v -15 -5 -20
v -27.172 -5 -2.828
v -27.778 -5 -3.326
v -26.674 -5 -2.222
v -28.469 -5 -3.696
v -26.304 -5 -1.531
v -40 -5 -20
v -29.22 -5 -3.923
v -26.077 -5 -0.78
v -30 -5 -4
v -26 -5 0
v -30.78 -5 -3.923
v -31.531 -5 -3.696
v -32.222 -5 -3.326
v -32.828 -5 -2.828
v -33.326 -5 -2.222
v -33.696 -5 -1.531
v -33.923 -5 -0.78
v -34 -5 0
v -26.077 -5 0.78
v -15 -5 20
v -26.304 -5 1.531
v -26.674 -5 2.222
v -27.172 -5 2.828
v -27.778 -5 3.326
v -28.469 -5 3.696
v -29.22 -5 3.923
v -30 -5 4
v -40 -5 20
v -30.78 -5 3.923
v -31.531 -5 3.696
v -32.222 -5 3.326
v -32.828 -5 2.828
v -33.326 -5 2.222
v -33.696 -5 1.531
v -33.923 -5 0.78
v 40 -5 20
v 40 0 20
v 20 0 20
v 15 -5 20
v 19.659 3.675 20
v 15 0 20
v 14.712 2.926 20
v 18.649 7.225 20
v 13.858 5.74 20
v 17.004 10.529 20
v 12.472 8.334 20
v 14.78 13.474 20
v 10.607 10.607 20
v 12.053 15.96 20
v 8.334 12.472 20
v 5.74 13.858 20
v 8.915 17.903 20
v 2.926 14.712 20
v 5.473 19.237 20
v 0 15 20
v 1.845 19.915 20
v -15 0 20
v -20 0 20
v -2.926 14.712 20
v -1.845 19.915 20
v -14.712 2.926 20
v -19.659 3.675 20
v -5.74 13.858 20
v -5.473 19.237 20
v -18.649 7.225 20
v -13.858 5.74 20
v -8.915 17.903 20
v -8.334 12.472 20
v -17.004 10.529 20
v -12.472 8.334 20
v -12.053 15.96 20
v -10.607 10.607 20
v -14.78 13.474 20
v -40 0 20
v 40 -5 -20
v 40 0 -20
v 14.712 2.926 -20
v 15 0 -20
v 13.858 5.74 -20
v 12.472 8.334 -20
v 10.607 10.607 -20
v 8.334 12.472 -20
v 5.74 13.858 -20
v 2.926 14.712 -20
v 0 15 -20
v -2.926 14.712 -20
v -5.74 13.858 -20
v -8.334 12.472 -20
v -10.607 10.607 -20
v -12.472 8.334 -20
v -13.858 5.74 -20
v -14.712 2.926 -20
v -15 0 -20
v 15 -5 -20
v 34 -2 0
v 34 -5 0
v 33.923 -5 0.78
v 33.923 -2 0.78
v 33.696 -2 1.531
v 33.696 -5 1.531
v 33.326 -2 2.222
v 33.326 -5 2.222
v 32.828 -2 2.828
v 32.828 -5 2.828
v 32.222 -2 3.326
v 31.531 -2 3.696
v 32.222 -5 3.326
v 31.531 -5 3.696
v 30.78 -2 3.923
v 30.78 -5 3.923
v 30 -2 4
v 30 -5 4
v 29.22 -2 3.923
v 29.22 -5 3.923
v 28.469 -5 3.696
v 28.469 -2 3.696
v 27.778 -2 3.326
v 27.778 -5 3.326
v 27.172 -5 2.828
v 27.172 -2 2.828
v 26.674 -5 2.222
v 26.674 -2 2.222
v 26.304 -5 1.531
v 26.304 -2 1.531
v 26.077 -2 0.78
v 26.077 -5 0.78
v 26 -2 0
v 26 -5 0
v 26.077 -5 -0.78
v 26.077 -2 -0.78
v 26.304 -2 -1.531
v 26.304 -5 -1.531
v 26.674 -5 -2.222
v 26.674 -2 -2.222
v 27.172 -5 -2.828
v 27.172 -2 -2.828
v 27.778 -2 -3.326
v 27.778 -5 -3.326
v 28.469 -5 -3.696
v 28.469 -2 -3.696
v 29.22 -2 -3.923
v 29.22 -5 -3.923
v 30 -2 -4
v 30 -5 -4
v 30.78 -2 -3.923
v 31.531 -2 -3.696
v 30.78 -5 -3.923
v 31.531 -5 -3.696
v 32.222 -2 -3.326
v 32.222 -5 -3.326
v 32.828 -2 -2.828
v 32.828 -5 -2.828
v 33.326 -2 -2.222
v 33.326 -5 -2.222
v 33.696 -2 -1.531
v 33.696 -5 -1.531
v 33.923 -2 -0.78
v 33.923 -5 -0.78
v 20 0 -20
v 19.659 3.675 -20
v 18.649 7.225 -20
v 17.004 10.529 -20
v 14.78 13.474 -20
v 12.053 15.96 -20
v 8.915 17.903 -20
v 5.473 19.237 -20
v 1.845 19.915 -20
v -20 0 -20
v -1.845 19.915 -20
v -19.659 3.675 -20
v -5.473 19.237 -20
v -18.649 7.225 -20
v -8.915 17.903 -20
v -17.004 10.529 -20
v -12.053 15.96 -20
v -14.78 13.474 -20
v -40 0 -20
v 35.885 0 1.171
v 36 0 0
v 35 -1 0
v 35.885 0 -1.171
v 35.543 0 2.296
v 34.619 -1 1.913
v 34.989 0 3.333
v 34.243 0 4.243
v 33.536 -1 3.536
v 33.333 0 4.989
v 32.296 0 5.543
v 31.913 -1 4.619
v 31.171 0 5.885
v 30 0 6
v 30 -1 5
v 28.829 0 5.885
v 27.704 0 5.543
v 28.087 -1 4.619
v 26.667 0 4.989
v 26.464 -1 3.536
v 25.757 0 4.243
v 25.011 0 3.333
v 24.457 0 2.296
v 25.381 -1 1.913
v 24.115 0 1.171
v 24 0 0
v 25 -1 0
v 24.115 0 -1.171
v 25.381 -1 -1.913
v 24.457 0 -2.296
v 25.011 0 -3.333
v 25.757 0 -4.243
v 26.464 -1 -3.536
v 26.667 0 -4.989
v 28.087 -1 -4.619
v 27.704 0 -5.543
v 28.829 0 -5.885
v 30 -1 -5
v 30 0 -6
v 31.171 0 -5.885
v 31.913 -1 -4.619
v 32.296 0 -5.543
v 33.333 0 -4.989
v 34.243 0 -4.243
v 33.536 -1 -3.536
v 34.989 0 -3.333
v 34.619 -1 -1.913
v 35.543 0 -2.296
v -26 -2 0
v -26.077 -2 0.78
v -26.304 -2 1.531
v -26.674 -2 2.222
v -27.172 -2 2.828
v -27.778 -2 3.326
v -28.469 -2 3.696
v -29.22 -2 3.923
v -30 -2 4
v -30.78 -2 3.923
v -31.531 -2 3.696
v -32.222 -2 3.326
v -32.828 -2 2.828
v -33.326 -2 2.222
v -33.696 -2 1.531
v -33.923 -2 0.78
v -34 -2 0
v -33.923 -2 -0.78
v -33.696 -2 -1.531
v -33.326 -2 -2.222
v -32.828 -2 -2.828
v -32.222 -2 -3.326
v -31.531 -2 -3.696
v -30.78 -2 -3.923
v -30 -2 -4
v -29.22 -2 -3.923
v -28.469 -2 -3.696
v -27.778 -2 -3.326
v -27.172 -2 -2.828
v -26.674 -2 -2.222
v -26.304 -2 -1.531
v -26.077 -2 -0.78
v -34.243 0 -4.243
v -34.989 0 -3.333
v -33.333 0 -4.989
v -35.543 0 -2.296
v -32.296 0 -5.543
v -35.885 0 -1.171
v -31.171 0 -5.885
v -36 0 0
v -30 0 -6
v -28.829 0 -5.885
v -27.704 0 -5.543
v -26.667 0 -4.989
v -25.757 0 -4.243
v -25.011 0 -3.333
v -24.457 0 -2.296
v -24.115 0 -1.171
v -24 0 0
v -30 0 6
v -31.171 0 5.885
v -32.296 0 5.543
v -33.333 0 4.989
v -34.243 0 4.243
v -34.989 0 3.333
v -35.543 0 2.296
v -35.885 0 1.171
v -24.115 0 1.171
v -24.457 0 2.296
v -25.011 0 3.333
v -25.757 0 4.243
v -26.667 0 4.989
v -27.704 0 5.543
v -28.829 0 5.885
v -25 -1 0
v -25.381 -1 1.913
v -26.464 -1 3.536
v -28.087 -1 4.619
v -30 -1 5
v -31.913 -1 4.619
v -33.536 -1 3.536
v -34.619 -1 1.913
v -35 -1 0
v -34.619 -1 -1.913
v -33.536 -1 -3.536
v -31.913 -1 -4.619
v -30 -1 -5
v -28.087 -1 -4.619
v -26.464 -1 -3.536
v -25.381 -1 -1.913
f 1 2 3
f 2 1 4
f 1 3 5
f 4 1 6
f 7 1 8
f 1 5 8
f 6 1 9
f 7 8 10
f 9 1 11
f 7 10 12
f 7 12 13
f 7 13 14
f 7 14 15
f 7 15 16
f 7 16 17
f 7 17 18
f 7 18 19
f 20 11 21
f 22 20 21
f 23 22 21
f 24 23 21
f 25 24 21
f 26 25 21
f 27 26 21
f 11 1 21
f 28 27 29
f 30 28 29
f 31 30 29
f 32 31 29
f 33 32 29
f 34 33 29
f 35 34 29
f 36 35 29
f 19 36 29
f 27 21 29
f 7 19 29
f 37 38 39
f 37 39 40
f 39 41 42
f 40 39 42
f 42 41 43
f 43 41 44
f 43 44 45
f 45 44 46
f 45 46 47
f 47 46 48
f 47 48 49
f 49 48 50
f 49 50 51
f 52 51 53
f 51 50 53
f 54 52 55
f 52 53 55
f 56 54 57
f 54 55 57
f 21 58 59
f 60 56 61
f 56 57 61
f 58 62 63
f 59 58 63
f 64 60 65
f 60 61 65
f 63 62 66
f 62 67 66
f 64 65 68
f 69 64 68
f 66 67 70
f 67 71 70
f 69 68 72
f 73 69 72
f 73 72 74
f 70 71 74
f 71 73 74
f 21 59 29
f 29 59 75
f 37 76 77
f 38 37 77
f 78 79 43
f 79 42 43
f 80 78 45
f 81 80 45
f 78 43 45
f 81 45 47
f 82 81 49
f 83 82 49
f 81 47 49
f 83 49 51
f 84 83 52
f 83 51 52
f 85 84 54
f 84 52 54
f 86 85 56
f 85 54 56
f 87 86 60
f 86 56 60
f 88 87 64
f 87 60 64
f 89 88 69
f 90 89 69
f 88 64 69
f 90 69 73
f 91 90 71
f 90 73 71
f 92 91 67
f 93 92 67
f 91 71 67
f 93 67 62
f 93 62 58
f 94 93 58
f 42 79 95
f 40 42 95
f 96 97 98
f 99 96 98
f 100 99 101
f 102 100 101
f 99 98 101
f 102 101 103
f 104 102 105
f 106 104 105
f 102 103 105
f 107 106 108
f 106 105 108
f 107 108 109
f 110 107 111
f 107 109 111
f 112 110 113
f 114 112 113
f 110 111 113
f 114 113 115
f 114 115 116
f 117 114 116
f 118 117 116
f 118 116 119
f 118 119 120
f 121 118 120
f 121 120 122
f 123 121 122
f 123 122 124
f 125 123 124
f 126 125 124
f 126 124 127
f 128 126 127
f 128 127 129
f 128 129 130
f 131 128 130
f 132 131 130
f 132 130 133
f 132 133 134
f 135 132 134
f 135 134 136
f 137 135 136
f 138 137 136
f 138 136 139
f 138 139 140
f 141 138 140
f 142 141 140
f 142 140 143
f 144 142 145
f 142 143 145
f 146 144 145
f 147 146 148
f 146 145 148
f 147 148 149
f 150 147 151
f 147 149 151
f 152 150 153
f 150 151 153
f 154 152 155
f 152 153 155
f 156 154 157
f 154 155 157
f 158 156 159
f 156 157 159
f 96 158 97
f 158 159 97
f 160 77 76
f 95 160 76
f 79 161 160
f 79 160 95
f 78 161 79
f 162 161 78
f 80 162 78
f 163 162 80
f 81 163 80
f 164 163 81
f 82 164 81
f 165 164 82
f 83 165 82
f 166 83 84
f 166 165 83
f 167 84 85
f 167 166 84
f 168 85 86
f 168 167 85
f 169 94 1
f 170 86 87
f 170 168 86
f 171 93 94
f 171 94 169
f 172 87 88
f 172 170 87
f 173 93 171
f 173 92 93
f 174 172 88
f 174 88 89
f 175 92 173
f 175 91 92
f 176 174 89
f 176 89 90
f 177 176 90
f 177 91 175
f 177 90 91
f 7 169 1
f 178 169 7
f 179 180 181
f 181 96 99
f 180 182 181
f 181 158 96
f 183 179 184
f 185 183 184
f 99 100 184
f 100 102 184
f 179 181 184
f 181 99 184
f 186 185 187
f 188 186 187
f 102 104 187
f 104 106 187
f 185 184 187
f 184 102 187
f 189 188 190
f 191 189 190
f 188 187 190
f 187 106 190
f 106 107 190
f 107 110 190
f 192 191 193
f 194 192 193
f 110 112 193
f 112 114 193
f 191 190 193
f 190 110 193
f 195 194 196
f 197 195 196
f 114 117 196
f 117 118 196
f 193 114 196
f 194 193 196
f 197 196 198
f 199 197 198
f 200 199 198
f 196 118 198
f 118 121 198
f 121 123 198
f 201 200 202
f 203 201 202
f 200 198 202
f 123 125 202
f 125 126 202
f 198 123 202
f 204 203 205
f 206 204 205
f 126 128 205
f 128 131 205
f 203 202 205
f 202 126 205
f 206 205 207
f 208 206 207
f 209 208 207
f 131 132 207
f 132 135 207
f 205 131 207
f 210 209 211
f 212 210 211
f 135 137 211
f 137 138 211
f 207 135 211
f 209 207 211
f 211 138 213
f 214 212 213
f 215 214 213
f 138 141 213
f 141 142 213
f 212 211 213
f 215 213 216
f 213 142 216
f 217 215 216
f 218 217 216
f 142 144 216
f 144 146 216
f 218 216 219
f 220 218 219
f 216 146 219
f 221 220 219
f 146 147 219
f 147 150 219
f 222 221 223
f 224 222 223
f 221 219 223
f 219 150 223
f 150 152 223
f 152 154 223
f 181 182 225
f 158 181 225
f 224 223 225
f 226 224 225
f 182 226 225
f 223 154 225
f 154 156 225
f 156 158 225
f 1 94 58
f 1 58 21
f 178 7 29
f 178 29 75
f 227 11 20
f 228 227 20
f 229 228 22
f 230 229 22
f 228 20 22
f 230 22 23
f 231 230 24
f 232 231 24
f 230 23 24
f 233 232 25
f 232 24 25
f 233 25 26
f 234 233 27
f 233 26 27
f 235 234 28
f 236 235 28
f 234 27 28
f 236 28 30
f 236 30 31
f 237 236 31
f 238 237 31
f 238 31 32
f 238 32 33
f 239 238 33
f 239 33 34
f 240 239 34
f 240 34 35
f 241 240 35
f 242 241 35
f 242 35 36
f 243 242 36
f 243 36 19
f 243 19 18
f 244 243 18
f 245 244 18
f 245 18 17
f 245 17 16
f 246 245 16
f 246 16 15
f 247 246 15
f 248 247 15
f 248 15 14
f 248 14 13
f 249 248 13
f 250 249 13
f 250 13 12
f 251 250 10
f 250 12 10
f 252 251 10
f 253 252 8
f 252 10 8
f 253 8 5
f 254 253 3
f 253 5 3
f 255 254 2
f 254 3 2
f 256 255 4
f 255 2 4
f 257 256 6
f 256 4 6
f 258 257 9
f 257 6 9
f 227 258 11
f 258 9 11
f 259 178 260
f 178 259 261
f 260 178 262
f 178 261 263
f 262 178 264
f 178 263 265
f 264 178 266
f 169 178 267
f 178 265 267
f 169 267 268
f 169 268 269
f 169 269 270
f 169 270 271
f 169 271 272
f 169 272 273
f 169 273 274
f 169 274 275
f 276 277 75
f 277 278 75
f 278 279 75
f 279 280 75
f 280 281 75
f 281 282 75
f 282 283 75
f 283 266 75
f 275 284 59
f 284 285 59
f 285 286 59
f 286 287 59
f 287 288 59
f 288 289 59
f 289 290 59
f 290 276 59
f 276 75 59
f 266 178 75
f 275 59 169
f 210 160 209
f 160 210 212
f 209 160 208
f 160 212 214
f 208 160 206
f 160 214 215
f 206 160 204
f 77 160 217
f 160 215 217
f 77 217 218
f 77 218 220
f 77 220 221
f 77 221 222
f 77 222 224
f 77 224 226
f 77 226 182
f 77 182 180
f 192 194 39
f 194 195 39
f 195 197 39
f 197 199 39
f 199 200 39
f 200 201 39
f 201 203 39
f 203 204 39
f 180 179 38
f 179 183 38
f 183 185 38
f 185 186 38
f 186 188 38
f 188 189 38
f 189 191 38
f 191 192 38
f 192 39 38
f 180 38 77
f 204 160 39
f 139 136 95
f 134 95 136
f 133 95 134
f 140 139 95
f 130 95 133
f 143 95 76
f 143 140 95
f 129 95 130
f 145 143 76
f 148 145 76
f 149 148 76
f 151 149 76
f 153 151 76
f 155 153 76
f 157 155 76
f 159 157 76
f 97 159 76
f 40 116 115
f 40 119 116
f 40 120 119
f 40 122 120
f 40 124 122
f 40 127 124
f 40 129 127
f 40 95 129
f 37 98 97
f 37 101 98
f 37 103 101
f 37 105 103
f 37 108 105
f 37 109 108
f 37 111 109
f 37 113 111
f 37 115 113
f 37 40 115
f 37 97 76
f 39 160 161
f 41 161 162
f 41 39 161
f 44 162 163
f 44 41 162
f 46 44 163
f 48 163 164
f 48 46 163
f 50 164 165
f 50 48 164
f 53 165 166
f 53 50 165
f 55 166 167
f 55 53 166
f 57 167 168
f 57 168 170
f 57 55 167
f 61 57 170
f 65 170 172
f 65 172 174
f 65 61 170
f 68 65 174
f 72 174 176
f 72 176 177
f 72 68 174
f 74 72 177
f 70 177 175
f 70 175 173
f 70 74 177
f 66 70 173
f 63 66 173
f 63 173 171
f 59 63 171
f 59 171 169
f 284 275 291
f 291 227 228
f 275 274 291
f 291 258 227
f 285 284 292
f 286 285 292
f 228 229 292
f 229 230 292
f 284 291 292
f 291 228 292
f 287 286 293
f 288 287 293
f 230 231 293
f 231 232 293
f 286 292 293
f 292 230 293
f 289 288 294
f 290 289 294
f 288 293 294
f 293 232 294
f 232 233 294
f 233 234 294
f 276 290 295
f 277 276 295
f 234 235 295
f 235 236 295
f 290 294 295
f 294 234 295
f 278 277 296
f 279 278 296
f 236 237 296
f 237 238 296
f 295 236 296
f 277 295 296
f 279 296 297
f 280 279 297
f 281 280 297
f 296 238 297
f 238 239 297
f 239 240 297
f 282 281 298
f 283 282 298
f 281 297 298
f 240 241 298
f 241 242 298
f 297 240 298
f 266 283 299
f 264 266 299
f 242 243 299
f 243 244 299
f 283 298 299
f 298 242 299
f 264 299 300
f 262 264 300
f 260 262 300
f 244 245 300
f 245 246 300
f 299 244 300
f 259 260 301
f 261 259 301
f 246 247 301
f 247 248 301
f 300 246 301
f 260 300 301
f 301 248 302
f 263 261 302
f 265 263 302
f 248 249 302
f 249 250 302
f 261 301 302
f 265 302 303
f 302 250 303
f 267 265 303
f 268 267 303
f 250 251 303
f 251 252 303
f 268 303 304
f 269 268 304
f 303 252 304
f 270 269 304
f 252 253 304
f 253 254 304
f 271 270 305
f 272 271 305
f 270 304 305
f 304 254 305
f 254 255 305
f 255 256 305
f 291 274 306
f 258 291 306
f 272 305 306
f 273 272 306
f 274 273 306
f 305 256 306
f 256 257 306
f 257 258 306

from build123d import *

# Parameters (mm, degrees)
PAD_DEPTH    = 20
SKETCH001_R  = 4
POCKET_DEPTH = 25.001
CHAMFER_SIZE = 2


with BuildPart() as part:
    # Sketch → Pad (new body, symmetric)
    with BuildSketch(Plane.XY):
        with BuildLine():
            Line((-40, 0), (-20, 0))
            ThreePointArc((20, 0), (0, 20), (-20, 0))
            Line((20, 0), (40, 0))
            Line((40, -5), (40, 0))
            Line((15, -5), (40, -5))
            Line((15, 0), (15, -5))
            ThreePointArc((15, 0), (0, 15), (-15, 0))
            Line((-15, 0), (-15, -5))
            Line((-15, -5), (-40, -5))
            Line((-40, -5), (-40, 0))
        make_face()
    extrude(amount=PAD_DEPTH, both=True)

    # Sketch001 → Pocket (cut, through all)
    with BuildSketch(Plane.XZ.offset(5)):
        with Locations((-30, 0)):
            Circle(SKETCH001_R)
        with Locations((30, 0)):
            Circle(SKETCH001_R)
    extrude(amount=-POCKET_DEPTH, mode=Mode.SUBTRACT)

    # Chamfer
    chamfer_edges = [part.edges().sort_by_distance(p)[0] for p in [
        (26, 0, 0),
        (-34, 0, 0),
    ]]
    chamfer(chamfer_edges, length=CHAMFER_SIZE)


solid = part.part
